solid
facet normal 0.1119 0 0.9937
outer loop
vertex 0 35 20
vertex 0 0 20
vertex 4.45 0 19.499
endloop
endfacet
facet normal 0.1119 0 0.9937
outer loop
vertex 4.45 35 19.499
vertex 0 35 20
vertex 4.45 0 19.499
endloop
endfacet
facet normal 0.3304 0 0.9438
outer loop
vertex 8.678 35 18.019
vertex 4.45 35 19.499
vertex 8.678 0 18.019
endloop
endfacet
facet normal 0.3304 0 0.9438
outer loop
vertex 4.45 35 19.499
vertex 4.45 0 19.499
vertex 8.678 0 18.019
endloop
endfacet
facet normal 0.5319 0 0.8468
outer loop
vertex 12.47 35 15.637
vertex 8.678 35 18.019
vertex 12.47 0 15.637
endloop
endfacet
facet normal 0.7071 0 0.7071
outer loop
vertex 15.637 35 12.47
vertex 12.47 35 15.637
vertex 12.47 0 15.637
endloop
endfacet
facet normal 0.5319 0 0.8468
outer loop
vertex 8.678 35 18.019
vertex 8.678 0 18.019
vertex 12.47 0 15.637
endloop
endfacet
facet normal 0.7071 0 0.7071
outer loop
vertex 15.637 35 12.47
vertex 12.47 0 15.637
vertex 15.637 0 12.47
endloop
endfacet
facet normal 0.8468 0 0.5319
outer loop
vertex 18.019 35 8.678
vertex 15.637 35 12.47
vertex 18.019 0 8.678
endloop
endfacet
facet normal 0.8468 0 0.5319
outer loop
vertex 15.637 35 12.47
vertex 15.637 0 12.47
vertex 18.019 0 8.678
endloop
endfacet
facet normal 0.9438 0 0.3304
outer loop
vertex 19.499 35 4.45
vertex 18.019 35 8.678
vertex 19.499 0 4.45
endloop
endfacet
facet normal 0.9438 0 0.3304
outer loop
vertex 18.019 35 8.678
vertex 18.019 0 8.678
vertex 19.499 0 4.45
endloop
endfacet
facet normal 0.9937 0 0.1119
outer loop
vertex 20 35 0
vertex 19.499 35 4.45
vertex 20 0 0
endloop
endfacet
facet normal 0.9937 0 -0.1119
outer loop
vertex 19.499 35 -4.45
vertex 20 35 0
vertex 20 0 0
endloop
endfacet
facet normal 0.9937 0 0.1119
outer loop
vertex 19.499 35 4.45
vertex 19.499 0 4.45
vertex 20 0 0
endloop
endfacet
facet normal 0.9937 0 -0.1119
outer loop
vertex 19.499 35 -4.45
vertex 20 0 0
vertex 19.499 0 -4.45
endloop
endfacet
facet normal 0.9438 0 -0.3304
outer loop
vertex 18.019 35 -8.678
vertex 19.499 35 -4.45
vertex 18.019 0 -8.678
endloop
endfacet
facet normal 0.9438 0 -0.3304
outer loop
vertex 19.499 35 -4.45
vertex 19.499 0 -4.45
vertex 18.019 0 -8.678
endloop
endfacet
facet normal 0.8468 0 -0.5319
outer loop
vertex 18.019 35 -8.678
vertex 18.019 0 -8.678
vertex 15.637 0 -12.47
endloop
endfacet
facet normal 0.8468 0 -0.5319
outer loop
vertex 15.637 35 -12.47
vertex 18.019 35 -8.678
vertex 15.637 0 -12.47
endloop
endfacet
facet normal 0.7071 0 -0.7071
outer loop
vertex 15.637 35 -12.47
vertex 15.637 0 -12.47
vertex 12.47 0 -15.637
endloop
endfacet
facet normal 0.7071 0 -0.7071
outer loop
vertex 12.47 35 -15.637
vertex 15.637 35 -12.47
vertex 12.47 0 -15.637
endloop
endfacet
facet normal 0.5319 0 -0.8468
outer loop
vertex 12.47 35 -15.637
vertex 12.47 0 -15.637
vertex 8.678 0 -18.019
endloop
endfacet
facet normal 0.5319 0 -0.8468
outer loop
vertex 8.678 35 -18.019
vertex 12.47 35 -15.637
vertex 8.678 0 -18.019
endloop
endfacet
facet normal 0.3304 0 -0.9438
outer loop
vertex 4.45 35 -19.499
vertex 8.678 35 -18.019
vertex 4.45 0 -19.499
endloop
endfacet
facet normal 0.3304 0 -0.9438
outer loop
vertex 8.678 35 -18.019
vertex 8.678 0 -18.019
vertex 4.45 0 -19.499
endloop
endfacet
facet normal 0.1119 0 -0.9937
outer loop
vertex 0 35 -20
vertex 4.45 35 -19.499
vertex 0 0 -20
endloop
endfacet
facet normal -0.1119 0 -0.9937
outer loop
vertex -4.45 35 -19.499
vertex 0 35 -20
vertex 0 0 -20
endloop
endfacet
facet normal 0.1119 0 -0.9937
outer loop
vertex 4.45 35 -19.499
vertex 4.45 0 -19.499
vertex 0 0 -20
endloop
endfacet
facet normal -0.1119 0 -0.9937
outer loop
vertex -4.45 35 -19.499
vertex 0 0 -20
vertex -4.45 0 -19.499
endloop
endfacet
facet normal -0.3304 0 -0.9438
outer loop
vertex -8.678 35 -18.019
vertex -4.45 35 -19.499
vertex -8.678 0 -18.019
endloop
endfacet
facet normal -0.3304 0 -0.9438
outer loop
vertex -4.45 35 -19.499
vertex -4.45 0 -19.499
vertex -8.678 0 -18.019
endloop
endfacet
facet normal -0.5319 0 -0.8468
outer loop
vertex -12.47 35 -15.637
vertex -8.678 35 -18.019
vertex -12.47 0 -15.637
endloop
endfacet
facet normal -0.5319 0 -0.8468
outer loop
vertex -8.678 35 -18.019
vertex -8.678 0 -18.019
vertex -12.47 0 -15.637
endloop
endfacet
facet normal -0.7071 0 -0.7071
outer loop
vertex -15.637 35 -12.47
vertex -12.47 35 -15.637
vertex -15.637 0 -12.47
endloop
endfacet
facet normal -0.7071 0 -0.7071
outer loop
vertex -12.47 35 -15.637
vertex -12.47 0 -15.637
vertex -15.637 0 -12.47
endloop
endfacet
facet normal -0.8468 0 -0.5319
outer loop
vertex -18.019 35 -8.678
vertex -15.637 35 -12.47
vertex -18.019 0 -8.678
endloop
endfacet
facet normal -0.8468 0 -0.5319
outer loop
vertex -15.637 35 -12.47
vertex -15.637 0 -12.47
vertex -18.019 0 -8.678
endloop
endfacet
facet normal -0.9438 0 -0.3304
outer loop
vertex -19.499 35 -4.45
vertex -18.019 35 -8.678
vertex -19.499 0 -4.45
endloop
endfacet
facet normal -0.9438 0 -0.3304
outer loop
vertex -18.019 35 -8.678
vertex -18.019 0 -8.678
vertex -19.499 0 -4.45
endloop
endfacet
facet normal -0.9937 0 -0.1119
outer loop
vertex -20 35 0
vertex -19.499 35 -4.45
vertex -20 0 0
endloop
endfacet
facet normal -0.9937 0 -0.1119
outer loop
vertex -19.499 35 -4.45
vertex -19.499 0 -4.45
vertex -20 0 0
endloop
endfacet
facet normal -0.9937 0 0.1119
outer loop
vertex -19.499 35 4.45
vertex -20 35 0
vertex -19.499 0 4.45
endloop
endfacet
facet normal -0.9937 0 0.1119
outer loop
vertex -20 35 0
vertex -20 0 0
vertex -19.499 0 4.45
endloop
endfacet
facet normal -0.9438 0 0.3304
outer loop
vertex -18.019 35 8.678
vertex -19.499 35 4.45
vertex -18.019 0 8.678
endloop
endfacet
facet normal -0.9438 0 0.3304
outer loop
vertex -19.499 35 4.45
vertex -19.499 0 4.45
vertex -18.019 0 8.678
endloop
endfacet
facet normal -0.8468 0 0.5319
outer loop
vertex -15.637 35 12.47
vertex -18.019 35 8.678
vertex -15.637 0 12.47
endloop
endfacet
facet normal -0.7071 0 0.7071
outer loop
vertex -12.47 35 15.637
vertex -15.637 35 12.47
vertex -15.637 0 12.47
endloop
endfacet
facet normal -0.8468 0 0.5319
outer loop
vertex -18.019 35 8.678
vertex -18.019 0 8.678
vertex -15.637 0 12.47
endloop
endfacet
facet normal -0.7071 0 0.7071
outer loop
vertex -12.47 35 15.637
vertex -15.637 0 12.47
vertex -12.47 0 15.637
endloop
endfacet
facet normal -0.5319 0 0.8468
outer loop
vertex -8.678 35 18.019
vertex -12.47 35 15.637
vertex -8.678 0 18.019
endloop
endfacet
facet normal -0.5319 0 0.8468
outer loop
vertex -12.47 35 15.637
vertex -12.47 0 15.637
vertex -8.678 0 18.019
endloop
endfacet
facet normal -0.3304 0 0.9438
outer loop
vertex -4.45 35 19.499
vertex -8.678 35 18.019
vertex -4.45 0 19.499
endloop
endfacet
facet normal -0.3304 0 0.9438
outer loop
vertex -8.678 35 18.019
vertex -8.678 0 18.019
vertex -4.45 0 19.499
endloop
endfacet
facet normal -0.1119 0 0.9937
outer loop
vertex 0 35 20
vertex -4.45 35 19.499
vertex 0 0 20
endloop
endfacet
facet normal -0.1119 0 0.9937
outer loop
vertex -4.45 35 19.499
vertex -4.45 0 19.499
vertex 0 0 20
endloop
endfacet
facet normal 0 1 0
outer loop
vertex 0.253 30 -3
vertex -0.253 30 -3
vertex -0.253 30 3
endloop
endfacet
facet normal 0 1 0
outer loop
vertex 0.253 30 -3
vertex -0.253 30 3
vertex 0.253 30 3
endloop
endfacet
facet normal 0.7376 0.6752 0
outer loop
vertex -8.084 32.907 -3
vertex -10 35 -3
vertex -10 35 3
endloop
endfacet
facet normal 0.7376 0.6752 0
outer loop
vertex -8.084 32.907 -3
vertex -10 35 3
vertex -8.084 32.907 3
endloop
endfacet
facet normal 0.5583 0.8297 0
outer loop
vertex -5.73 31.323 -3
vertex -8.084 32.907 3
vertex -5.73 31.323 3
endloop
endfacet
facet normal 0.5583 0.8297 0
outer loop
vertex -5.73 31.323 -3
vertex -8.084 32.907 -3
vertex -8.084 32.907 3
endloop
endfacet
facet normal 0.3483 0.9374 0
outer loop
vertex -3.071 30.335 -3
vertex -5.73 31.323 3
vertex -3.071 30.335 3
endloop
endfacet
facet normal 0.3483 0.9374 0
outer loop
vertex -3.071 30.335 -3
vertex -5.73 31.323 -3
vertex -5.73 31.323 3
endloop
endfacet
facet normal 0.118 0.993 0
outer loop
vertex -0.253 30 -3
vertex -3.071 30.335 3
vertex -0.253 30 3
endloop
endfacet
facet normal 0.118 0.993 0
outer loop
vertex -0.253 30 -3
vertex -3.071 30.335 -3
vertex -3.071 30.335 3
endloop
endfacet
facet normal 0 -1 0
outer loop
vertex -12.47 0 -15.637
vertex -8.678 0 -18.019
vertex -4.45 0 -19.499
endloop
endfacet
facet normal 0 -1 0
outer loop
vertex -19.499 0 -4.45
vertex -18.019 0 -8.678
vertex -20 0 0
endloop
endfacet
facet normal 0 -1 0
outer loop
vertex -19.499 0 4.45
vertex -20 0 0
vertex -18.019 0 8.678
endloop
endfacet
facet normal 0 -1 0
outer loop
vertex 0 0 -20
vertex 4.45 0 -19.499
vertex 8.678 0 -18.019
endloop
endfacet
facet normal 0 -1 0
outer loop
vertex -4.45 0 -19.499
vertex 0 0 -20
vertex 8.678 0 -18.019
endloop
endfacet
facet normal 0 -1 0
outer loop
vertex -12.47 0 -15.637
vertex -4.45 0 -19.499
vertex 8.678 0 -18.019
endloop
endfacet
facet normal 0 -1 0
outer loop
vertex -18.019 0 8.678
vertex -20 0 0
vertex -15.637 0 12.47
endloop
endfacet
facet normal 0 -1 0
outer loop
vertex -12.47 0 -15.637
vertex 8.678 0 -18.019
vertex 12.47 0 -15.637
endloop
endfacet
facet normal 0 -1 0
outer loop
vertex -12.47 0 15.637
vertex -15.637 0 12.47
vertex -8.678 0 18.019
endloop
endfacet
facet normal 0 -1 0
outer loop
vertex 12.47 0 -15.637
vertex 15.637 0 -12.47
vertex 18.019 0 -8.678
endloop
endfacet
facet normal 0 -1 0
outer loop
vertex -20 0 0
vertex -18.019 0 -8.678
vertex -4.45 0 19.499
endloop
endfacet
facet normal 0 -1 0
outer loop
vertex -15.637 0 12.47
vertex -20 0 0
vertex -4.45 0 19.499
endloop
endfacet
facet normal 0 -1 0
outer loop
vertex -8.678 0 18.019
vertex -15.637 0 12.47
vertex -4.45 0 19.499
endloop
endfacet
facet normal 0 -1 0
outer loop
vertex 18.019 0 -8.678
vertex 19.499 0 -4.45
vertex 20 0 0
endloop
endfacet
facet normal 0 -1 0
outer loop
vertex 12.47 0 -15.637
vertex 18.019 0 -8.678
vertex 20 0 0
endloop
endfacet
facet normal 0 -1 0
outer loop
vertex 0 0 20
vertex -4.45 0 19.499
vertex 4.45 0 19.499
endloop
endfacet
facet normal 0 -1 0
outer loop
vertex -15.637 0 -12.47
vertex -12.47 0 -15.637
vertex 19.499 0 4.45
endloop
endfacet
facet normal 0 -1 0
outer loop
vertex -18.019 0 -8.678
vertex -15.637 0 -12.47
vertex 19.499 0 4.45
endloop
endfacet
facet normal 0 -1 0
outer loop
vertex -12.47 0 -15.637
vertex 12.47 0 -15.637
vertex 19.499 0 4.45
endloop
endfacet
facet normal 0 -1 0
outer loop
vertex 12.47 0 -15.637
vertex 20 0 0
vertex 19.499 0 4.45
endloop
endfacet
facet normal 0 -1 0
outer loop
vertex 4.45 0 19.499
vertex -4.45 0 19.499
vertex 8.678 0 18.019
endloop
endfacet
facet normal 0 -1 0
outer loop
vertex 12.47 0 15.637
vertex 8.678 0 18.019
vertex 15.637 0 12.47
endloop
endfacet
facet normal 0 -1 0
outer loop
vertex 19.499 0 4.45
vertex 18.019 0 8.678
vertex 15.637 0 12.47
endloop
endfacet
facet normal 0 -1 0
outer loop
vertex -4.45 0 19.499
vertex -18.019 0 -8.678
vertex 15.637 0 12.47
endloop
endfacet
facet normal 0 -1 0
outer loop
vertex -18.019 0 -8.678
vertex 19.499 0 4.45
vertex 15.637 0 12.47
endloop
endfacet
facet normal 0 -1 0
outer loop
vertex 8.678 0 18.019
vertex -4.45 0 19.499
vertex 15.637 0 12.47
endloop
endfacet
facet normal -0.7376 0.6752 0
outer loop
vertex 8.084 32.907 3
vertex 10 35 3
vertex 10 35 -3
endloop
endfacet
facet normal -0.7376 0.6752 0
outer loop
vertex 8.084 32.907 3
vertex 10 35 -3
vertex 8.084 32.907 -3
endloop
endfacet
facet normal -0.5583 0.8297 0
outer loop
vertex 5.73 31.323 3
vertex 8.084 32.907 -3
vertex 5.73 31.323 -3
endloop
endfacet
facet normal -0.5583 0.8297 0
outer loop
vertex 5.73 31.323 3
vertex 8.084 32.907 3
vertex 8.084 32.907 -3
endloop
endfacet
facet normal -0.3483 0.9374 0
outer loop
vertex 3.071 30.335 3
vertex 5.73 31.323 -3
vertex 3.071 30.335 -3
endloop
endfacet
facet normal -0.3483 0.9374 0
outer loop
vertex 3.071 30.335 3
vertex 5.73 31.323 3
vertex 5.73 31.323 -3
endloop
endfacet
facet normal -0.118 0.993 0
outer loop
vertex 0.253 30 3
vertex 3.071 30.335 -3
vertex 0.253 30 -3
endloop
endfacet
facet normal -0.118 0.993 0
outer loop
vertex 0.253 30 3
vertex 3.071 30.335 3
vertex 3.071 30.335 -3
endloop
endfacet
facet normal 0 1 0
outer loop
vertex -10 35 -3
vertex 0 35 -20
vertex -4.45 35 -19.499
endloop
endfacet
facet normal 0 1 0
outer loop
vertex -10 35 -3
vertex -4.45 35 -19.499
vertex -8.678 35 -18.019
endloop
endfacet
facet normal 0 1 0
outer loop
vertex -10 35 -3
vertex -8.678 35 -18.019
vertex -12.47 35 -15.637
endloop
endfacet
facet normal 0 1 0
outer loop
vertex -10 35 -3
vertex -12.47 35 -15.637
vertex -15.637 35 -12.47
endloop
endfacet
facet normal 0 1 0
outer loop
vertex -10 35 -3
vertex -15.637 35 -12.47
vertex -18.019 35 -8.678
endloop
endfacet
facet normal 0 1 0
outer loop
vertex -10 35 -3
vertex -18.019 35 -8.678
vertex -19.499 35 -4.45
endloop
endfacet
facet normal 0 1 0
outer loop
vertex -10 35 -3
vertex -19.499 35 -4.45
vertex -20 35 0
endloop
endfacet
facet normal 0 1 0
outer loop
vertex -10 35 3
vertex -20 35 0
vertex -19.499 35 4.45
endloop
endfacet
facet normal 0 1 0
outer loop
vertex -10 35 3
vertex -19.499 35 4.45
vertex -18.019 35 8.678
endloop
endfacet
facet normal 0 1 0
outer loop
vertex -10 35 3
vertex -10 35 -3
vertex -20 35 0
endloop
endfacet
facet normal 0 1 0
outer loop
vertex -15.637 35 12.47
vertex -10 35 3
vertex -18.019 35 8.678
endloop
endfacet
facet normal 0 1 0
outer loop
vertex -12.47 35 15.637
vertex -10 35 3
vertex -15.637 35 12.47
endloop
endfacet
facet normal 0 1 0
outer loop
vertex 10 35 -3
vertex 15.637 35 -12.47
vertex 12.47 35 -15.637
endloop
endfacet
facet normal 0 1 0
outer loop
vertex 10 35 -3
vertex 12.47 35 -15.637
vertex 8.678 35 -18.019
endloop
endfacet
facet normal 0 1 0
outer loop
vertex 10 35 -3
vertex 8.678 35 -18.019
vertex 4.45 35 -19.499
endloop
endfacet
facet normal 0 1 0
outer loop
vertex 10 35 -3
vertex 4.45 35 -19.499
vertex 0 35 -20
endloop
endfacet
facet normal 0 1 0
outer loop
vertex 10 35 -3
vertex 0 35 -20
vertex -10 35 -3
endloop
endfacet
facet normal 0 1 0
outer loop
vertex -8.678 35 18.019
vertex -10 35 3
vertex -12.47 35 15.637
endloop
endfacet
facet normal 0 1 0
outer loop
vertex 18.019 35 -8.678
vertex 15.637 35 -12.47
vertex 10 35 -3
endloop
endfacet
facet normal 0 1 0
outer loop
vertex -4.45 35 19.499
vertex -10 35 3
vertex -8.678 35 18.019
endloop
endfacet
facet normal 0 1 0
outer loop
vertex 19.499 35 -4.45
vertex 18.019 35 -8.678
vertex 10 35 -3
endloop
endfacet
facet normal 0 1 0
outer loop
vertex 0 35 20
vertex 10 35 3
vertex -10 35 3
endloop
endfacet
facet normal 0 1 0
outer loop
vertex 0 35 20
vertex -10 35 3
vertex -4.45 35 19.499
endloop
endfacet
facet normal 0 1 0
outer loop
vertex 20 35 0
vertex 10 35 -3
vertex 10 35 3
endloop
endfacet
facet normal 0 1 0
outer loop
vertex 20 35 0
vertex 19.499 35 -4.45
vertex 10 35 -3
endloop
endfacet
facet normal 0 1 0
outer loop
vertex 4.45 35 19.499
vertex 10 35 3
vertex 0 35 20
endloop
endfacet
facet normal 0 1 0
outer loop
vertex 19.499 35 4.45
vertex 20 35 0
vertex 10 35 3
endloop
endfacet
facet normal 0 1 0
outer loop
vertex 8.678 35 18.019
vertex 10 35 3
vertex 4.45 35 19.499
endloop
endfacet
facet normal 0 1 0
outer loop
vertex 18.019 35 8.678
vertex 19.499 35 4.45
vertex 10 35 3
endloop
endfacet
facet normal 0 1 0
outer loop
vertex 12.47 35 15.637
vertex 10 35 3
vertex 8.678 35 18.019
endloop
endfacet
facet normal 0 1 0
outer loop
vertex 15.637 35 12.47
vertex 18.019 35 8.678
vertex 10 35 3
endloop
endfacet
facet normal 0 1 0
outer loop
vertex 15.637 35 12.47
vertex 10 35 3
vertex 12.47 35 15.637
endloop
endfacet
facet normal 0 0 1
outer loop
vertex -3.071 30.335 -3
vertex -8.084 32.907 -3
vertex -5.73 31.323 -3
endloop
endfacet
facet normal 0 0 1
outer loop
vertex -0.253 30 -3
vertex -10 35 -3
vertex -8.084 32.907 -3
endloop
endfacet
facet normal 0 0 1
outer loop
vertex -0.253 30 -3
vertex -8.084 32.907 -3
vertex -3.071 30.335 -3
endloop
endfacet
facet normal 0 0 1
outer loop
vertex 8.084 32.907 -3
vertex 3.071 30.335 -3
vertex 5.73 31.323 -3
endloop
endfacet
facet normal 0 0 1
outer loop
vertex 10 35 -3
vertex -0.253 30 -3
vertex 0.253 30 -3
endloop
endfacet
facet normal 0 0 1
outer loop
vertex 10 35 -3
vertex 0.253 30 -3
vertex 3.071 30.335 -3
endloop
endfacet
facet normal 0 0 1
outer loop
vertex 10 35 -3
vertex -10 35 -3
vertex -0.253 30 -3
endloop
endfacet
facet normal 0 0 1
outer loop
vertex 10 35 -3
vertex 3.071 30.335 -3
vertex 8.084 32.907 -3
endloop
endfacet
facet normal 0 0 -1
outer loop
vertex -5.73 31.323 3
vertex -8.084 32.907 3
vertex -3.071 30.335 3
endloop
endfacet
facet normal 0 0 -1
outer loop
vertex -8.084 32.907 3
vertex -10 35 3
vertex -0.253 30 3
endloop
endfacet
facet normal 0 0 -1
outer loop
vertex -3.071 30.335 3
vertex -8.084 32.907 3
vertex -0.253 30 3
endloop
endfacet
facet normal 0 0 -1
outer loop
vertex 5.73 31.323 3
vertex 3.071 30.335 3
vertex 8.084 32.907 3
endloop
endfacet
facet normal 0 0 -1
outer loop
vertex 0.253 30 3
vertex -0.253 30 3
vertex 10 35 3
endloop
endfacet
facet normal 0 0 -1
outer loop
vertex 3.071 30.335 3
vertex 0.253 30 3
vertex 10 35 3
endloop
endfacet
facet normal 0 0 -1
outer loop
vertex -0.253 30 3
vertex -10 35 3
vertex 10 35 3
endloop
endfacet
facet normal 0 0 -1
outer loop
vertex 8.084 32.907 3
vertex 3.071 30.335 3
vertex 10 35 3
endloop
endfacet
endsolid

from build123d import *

# Parameters (mm, degrees)
SKETCH1_R           = 20
BOSS_EXTRUDE1_DEPTH = 35
SKETCH2_W           = 20
SKETCH2_H           = 6
CUT_EXTRUDE1_DEPTH  = 5
FILLET1_R           = 12


with BuildPart() as part:
    # Sketch1 → Boss-Extrude1 (new body)
    with BuildSketch(Plane(origin=(0, 0, 0), x_dir=(1, 0, 0), z_dir=(0, 1, 0))):
        with Locations(Location((0, 0, 0), (0, 0, 270))):
            Circle(SKETCH1_R)
    extrude(amount=BOSS_EXTRUDE1_DEPTH)

    # Sketch2 → Cut-Extrude1 (cut)
    with BuildSketch(Plane(origin=(0, 35, 0), x_dir=(1, 0, 0), z_dir=(0, 1, 0))):
        Rectangle(SKETCH2_W, SKETCH2_H)
    extrude(amount=-CUT_EXTRUDE1_DEPTH, mode=Mode.SUBTRACT)

    # Fillet1
    # the kernel refuses this fillet: 12 mm, written as the material it adds along each edge
    with BuildSketch(Plane(origin=(10, 30, 3), x_dir=(0, 1, 0), z_dir=(0, 0, -1)), Plane(origin=(-10, 30, -3), x_dir=(0, 1, 0), z_dir=(0, 0, 1))) as fillet1_piece_1:
        with BuildLine():
            CenterArc((12, -9.746794345), FILLET1_R, 125.685334713, 54.314665287)
            Line((0, -9.746794345), (0, 0))
            Line((0, 0), (5, 0))
        make_face()
    extrude(amount=6)


solid = part.part
